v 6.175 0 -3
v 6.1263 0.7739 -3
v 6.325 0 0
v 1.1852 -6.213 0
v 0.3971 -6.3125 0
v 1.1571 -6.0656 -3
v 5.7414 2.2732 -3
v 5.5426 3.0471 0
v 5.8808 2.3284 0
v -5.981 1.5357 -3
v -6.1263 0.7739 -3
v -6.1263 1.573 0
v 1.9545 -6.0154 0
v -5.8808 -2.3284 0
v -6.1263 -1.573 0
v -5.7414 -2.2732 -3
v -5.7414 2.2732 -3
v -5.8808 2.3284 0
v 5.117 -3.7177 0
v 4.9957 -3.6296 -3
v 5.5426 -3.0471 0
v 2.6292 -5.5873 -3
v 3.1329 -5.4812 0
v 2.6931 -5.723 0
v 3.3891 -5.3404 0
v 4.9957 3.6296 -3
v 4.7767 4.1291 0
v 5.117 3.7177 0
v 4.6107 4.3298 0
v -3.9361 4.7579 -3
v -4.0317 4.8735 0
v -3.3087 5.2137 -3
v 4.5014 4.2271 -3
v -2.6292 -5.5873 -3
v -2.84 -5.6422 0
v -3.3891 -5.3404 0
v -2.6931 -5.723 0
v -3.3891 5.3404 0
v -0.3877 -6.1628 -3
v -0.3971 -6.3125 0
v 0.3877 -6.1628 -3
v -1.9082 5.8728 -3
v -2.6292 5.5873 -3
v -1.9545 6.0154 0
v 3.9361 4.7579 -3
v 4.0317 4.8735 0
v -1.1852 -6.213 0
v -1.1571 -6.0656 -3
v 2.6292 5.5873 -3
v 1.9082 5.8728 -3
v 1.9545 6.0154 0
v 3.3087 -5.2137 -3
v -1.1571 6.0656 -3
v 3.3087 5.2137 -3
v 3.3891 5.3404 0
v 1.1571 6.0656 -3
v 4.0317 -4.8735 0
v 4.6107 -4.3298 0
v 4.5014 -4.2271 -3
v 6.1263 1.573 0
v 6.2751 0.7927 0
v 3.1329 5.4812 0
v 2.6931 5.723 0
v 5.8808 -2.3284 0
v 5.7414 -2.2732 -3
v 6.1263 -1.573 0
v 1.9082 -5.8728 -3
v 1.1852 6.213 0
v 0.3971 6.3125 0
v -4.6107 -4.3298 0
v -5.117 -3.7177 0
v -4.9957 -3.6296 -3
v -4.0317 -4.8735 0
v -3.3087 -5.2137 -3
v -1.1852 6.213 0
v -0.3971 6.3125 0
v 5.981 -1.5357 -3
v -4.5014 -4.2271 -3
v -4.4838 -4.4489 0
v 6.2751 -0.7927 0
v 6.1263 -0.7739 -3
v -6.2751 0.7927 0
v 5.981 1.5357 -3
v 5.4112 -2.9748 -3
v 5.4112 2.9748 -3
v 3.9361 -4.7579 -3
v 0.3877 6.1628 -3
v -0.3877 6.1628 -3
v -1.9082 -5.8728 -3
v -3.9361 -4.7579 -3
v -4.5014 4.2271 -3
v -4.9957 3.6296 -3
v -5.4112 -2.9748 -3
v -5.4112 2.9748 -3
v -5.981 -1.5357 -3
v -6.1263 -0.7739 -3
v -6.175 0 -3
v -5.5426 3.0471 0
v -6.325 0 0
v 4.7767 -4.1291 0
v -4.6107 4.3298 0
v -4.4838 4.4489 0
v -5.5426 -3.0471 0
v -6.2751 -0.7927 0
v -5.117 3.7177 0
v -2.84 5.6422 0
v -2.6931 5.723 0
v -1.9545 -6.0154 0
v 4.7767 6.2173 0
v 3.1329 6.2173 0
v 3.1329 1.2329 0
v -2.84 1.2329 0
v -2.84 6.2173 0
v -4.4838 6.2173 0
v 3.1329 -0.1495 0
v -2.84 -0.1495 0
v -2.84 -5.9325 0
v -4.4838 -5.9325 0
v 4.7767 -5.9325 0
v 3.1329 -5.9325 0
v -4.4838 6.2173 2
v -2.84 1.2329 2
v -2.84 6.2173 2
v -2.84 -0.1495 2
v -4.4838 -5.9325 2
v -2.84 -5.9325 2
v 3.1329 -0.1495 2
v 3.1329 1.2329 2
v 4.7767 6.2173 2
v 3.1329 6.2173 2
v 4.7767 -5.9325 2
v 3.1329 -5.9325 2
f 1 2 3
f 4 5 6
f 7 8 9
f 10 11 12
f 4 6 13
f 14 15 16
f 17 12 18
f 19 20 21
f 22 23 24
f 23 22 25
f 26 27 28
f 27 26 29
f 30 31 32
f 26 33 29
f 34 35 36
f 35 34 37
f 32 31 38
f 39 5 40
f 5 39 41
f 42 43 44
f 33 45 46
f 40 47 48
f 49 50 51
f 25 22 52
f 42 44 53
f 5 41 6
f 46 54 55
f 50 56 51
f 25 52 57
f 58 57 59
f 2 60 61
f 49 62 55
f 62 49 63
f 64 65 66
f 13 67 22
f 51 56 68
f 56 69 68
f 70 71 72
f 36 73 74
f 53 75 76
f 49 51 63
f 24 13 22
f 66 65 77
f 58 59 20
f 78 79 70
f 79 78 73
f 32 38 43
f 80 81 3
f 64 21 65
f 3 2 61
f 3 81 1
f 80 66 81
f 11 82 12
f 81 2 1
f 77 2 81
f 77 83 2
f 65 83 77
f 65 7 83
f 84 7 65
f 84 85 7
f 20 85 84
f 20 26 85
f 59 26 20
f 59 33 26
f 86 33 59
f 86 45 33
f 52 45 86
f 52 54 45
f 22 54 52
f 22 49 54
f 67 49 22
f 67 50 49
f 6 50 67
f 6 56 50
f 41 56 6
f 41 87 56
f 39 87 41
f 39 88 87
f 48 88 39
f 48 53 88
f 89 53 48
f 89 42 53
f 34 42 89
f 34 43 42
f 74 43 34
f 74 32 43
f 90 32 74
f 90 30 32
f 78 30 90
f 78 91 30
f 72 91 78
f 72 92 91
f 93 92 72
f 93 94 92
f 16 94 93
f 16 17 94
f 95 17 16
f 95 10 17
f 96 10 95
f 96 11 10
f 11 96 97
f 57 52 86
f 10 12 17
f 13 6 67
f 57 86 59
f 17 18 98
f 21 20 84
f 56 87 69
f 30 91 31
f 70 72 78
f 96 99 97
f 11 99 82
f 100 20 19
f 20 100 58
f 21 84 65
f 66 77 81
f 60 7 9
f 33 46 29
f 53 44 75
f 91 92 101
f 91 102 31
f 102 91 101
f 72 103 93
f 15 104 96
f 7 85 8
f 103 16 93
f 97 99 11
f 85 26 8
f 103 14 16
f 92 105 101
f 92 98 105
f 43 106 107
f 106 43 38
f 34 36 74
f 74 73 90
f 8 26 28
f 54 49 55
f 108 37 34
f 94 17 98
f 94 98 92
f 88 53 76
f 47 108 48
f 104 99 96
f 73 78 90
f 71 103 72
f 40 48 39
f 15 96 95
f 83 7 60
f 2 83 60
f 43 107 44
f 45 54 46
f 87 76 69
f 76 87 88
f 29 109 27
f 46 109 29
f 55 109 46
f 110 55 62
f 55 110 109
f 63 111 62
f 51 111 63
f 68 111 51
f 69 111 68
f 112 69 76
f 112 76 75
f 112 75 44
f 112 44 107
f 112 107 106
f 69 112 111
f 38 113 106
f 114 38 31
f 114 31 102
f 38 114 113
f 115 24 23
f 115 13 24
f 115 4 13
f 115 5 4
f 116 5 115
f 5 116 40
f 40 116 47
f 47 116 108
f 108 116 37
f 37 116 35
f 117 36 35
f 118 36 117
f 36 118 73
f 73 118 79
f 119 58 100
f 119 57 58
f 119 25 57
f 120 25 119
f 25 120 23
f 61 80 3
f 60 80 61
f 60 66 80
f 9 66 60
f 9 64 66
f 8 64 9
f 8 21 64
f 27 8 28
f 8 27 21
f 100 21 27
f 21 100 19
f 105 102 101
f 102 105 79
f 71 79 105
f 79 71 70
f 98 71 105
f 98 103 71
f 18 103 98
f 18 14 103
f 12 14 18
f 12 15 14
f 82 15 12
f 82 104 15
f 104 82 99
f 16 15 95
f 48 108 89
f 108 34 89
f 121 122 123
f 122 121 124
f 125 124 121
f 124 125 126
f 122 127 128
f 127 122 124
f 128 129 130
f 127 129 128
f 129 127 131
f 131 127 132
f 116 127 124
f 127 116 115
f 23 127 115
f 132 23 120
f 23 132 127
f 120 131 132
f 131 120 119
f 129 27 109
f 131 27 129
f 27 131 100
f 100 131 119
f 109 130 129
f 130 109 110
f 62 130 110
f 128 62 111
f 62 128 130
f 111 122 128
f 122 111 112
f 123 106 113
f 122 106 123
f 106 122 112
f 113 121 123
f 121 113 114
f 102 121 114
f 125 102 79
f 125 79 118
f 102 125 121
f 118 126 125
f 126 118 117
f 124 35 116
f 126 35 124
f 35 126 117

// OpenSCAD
$fn = 50;

difference() {
	union() {
		translate(v = [0, 0, -3.0]) {
			cylinder(h = 3, r1 = 6.175, r2 = 6.325);
		}
		linear_extrude(height = 2) {
			text(font = "Impact", halign = "center", size = 12, text = "H", valign = "center");
		}
	}
	union();
}
